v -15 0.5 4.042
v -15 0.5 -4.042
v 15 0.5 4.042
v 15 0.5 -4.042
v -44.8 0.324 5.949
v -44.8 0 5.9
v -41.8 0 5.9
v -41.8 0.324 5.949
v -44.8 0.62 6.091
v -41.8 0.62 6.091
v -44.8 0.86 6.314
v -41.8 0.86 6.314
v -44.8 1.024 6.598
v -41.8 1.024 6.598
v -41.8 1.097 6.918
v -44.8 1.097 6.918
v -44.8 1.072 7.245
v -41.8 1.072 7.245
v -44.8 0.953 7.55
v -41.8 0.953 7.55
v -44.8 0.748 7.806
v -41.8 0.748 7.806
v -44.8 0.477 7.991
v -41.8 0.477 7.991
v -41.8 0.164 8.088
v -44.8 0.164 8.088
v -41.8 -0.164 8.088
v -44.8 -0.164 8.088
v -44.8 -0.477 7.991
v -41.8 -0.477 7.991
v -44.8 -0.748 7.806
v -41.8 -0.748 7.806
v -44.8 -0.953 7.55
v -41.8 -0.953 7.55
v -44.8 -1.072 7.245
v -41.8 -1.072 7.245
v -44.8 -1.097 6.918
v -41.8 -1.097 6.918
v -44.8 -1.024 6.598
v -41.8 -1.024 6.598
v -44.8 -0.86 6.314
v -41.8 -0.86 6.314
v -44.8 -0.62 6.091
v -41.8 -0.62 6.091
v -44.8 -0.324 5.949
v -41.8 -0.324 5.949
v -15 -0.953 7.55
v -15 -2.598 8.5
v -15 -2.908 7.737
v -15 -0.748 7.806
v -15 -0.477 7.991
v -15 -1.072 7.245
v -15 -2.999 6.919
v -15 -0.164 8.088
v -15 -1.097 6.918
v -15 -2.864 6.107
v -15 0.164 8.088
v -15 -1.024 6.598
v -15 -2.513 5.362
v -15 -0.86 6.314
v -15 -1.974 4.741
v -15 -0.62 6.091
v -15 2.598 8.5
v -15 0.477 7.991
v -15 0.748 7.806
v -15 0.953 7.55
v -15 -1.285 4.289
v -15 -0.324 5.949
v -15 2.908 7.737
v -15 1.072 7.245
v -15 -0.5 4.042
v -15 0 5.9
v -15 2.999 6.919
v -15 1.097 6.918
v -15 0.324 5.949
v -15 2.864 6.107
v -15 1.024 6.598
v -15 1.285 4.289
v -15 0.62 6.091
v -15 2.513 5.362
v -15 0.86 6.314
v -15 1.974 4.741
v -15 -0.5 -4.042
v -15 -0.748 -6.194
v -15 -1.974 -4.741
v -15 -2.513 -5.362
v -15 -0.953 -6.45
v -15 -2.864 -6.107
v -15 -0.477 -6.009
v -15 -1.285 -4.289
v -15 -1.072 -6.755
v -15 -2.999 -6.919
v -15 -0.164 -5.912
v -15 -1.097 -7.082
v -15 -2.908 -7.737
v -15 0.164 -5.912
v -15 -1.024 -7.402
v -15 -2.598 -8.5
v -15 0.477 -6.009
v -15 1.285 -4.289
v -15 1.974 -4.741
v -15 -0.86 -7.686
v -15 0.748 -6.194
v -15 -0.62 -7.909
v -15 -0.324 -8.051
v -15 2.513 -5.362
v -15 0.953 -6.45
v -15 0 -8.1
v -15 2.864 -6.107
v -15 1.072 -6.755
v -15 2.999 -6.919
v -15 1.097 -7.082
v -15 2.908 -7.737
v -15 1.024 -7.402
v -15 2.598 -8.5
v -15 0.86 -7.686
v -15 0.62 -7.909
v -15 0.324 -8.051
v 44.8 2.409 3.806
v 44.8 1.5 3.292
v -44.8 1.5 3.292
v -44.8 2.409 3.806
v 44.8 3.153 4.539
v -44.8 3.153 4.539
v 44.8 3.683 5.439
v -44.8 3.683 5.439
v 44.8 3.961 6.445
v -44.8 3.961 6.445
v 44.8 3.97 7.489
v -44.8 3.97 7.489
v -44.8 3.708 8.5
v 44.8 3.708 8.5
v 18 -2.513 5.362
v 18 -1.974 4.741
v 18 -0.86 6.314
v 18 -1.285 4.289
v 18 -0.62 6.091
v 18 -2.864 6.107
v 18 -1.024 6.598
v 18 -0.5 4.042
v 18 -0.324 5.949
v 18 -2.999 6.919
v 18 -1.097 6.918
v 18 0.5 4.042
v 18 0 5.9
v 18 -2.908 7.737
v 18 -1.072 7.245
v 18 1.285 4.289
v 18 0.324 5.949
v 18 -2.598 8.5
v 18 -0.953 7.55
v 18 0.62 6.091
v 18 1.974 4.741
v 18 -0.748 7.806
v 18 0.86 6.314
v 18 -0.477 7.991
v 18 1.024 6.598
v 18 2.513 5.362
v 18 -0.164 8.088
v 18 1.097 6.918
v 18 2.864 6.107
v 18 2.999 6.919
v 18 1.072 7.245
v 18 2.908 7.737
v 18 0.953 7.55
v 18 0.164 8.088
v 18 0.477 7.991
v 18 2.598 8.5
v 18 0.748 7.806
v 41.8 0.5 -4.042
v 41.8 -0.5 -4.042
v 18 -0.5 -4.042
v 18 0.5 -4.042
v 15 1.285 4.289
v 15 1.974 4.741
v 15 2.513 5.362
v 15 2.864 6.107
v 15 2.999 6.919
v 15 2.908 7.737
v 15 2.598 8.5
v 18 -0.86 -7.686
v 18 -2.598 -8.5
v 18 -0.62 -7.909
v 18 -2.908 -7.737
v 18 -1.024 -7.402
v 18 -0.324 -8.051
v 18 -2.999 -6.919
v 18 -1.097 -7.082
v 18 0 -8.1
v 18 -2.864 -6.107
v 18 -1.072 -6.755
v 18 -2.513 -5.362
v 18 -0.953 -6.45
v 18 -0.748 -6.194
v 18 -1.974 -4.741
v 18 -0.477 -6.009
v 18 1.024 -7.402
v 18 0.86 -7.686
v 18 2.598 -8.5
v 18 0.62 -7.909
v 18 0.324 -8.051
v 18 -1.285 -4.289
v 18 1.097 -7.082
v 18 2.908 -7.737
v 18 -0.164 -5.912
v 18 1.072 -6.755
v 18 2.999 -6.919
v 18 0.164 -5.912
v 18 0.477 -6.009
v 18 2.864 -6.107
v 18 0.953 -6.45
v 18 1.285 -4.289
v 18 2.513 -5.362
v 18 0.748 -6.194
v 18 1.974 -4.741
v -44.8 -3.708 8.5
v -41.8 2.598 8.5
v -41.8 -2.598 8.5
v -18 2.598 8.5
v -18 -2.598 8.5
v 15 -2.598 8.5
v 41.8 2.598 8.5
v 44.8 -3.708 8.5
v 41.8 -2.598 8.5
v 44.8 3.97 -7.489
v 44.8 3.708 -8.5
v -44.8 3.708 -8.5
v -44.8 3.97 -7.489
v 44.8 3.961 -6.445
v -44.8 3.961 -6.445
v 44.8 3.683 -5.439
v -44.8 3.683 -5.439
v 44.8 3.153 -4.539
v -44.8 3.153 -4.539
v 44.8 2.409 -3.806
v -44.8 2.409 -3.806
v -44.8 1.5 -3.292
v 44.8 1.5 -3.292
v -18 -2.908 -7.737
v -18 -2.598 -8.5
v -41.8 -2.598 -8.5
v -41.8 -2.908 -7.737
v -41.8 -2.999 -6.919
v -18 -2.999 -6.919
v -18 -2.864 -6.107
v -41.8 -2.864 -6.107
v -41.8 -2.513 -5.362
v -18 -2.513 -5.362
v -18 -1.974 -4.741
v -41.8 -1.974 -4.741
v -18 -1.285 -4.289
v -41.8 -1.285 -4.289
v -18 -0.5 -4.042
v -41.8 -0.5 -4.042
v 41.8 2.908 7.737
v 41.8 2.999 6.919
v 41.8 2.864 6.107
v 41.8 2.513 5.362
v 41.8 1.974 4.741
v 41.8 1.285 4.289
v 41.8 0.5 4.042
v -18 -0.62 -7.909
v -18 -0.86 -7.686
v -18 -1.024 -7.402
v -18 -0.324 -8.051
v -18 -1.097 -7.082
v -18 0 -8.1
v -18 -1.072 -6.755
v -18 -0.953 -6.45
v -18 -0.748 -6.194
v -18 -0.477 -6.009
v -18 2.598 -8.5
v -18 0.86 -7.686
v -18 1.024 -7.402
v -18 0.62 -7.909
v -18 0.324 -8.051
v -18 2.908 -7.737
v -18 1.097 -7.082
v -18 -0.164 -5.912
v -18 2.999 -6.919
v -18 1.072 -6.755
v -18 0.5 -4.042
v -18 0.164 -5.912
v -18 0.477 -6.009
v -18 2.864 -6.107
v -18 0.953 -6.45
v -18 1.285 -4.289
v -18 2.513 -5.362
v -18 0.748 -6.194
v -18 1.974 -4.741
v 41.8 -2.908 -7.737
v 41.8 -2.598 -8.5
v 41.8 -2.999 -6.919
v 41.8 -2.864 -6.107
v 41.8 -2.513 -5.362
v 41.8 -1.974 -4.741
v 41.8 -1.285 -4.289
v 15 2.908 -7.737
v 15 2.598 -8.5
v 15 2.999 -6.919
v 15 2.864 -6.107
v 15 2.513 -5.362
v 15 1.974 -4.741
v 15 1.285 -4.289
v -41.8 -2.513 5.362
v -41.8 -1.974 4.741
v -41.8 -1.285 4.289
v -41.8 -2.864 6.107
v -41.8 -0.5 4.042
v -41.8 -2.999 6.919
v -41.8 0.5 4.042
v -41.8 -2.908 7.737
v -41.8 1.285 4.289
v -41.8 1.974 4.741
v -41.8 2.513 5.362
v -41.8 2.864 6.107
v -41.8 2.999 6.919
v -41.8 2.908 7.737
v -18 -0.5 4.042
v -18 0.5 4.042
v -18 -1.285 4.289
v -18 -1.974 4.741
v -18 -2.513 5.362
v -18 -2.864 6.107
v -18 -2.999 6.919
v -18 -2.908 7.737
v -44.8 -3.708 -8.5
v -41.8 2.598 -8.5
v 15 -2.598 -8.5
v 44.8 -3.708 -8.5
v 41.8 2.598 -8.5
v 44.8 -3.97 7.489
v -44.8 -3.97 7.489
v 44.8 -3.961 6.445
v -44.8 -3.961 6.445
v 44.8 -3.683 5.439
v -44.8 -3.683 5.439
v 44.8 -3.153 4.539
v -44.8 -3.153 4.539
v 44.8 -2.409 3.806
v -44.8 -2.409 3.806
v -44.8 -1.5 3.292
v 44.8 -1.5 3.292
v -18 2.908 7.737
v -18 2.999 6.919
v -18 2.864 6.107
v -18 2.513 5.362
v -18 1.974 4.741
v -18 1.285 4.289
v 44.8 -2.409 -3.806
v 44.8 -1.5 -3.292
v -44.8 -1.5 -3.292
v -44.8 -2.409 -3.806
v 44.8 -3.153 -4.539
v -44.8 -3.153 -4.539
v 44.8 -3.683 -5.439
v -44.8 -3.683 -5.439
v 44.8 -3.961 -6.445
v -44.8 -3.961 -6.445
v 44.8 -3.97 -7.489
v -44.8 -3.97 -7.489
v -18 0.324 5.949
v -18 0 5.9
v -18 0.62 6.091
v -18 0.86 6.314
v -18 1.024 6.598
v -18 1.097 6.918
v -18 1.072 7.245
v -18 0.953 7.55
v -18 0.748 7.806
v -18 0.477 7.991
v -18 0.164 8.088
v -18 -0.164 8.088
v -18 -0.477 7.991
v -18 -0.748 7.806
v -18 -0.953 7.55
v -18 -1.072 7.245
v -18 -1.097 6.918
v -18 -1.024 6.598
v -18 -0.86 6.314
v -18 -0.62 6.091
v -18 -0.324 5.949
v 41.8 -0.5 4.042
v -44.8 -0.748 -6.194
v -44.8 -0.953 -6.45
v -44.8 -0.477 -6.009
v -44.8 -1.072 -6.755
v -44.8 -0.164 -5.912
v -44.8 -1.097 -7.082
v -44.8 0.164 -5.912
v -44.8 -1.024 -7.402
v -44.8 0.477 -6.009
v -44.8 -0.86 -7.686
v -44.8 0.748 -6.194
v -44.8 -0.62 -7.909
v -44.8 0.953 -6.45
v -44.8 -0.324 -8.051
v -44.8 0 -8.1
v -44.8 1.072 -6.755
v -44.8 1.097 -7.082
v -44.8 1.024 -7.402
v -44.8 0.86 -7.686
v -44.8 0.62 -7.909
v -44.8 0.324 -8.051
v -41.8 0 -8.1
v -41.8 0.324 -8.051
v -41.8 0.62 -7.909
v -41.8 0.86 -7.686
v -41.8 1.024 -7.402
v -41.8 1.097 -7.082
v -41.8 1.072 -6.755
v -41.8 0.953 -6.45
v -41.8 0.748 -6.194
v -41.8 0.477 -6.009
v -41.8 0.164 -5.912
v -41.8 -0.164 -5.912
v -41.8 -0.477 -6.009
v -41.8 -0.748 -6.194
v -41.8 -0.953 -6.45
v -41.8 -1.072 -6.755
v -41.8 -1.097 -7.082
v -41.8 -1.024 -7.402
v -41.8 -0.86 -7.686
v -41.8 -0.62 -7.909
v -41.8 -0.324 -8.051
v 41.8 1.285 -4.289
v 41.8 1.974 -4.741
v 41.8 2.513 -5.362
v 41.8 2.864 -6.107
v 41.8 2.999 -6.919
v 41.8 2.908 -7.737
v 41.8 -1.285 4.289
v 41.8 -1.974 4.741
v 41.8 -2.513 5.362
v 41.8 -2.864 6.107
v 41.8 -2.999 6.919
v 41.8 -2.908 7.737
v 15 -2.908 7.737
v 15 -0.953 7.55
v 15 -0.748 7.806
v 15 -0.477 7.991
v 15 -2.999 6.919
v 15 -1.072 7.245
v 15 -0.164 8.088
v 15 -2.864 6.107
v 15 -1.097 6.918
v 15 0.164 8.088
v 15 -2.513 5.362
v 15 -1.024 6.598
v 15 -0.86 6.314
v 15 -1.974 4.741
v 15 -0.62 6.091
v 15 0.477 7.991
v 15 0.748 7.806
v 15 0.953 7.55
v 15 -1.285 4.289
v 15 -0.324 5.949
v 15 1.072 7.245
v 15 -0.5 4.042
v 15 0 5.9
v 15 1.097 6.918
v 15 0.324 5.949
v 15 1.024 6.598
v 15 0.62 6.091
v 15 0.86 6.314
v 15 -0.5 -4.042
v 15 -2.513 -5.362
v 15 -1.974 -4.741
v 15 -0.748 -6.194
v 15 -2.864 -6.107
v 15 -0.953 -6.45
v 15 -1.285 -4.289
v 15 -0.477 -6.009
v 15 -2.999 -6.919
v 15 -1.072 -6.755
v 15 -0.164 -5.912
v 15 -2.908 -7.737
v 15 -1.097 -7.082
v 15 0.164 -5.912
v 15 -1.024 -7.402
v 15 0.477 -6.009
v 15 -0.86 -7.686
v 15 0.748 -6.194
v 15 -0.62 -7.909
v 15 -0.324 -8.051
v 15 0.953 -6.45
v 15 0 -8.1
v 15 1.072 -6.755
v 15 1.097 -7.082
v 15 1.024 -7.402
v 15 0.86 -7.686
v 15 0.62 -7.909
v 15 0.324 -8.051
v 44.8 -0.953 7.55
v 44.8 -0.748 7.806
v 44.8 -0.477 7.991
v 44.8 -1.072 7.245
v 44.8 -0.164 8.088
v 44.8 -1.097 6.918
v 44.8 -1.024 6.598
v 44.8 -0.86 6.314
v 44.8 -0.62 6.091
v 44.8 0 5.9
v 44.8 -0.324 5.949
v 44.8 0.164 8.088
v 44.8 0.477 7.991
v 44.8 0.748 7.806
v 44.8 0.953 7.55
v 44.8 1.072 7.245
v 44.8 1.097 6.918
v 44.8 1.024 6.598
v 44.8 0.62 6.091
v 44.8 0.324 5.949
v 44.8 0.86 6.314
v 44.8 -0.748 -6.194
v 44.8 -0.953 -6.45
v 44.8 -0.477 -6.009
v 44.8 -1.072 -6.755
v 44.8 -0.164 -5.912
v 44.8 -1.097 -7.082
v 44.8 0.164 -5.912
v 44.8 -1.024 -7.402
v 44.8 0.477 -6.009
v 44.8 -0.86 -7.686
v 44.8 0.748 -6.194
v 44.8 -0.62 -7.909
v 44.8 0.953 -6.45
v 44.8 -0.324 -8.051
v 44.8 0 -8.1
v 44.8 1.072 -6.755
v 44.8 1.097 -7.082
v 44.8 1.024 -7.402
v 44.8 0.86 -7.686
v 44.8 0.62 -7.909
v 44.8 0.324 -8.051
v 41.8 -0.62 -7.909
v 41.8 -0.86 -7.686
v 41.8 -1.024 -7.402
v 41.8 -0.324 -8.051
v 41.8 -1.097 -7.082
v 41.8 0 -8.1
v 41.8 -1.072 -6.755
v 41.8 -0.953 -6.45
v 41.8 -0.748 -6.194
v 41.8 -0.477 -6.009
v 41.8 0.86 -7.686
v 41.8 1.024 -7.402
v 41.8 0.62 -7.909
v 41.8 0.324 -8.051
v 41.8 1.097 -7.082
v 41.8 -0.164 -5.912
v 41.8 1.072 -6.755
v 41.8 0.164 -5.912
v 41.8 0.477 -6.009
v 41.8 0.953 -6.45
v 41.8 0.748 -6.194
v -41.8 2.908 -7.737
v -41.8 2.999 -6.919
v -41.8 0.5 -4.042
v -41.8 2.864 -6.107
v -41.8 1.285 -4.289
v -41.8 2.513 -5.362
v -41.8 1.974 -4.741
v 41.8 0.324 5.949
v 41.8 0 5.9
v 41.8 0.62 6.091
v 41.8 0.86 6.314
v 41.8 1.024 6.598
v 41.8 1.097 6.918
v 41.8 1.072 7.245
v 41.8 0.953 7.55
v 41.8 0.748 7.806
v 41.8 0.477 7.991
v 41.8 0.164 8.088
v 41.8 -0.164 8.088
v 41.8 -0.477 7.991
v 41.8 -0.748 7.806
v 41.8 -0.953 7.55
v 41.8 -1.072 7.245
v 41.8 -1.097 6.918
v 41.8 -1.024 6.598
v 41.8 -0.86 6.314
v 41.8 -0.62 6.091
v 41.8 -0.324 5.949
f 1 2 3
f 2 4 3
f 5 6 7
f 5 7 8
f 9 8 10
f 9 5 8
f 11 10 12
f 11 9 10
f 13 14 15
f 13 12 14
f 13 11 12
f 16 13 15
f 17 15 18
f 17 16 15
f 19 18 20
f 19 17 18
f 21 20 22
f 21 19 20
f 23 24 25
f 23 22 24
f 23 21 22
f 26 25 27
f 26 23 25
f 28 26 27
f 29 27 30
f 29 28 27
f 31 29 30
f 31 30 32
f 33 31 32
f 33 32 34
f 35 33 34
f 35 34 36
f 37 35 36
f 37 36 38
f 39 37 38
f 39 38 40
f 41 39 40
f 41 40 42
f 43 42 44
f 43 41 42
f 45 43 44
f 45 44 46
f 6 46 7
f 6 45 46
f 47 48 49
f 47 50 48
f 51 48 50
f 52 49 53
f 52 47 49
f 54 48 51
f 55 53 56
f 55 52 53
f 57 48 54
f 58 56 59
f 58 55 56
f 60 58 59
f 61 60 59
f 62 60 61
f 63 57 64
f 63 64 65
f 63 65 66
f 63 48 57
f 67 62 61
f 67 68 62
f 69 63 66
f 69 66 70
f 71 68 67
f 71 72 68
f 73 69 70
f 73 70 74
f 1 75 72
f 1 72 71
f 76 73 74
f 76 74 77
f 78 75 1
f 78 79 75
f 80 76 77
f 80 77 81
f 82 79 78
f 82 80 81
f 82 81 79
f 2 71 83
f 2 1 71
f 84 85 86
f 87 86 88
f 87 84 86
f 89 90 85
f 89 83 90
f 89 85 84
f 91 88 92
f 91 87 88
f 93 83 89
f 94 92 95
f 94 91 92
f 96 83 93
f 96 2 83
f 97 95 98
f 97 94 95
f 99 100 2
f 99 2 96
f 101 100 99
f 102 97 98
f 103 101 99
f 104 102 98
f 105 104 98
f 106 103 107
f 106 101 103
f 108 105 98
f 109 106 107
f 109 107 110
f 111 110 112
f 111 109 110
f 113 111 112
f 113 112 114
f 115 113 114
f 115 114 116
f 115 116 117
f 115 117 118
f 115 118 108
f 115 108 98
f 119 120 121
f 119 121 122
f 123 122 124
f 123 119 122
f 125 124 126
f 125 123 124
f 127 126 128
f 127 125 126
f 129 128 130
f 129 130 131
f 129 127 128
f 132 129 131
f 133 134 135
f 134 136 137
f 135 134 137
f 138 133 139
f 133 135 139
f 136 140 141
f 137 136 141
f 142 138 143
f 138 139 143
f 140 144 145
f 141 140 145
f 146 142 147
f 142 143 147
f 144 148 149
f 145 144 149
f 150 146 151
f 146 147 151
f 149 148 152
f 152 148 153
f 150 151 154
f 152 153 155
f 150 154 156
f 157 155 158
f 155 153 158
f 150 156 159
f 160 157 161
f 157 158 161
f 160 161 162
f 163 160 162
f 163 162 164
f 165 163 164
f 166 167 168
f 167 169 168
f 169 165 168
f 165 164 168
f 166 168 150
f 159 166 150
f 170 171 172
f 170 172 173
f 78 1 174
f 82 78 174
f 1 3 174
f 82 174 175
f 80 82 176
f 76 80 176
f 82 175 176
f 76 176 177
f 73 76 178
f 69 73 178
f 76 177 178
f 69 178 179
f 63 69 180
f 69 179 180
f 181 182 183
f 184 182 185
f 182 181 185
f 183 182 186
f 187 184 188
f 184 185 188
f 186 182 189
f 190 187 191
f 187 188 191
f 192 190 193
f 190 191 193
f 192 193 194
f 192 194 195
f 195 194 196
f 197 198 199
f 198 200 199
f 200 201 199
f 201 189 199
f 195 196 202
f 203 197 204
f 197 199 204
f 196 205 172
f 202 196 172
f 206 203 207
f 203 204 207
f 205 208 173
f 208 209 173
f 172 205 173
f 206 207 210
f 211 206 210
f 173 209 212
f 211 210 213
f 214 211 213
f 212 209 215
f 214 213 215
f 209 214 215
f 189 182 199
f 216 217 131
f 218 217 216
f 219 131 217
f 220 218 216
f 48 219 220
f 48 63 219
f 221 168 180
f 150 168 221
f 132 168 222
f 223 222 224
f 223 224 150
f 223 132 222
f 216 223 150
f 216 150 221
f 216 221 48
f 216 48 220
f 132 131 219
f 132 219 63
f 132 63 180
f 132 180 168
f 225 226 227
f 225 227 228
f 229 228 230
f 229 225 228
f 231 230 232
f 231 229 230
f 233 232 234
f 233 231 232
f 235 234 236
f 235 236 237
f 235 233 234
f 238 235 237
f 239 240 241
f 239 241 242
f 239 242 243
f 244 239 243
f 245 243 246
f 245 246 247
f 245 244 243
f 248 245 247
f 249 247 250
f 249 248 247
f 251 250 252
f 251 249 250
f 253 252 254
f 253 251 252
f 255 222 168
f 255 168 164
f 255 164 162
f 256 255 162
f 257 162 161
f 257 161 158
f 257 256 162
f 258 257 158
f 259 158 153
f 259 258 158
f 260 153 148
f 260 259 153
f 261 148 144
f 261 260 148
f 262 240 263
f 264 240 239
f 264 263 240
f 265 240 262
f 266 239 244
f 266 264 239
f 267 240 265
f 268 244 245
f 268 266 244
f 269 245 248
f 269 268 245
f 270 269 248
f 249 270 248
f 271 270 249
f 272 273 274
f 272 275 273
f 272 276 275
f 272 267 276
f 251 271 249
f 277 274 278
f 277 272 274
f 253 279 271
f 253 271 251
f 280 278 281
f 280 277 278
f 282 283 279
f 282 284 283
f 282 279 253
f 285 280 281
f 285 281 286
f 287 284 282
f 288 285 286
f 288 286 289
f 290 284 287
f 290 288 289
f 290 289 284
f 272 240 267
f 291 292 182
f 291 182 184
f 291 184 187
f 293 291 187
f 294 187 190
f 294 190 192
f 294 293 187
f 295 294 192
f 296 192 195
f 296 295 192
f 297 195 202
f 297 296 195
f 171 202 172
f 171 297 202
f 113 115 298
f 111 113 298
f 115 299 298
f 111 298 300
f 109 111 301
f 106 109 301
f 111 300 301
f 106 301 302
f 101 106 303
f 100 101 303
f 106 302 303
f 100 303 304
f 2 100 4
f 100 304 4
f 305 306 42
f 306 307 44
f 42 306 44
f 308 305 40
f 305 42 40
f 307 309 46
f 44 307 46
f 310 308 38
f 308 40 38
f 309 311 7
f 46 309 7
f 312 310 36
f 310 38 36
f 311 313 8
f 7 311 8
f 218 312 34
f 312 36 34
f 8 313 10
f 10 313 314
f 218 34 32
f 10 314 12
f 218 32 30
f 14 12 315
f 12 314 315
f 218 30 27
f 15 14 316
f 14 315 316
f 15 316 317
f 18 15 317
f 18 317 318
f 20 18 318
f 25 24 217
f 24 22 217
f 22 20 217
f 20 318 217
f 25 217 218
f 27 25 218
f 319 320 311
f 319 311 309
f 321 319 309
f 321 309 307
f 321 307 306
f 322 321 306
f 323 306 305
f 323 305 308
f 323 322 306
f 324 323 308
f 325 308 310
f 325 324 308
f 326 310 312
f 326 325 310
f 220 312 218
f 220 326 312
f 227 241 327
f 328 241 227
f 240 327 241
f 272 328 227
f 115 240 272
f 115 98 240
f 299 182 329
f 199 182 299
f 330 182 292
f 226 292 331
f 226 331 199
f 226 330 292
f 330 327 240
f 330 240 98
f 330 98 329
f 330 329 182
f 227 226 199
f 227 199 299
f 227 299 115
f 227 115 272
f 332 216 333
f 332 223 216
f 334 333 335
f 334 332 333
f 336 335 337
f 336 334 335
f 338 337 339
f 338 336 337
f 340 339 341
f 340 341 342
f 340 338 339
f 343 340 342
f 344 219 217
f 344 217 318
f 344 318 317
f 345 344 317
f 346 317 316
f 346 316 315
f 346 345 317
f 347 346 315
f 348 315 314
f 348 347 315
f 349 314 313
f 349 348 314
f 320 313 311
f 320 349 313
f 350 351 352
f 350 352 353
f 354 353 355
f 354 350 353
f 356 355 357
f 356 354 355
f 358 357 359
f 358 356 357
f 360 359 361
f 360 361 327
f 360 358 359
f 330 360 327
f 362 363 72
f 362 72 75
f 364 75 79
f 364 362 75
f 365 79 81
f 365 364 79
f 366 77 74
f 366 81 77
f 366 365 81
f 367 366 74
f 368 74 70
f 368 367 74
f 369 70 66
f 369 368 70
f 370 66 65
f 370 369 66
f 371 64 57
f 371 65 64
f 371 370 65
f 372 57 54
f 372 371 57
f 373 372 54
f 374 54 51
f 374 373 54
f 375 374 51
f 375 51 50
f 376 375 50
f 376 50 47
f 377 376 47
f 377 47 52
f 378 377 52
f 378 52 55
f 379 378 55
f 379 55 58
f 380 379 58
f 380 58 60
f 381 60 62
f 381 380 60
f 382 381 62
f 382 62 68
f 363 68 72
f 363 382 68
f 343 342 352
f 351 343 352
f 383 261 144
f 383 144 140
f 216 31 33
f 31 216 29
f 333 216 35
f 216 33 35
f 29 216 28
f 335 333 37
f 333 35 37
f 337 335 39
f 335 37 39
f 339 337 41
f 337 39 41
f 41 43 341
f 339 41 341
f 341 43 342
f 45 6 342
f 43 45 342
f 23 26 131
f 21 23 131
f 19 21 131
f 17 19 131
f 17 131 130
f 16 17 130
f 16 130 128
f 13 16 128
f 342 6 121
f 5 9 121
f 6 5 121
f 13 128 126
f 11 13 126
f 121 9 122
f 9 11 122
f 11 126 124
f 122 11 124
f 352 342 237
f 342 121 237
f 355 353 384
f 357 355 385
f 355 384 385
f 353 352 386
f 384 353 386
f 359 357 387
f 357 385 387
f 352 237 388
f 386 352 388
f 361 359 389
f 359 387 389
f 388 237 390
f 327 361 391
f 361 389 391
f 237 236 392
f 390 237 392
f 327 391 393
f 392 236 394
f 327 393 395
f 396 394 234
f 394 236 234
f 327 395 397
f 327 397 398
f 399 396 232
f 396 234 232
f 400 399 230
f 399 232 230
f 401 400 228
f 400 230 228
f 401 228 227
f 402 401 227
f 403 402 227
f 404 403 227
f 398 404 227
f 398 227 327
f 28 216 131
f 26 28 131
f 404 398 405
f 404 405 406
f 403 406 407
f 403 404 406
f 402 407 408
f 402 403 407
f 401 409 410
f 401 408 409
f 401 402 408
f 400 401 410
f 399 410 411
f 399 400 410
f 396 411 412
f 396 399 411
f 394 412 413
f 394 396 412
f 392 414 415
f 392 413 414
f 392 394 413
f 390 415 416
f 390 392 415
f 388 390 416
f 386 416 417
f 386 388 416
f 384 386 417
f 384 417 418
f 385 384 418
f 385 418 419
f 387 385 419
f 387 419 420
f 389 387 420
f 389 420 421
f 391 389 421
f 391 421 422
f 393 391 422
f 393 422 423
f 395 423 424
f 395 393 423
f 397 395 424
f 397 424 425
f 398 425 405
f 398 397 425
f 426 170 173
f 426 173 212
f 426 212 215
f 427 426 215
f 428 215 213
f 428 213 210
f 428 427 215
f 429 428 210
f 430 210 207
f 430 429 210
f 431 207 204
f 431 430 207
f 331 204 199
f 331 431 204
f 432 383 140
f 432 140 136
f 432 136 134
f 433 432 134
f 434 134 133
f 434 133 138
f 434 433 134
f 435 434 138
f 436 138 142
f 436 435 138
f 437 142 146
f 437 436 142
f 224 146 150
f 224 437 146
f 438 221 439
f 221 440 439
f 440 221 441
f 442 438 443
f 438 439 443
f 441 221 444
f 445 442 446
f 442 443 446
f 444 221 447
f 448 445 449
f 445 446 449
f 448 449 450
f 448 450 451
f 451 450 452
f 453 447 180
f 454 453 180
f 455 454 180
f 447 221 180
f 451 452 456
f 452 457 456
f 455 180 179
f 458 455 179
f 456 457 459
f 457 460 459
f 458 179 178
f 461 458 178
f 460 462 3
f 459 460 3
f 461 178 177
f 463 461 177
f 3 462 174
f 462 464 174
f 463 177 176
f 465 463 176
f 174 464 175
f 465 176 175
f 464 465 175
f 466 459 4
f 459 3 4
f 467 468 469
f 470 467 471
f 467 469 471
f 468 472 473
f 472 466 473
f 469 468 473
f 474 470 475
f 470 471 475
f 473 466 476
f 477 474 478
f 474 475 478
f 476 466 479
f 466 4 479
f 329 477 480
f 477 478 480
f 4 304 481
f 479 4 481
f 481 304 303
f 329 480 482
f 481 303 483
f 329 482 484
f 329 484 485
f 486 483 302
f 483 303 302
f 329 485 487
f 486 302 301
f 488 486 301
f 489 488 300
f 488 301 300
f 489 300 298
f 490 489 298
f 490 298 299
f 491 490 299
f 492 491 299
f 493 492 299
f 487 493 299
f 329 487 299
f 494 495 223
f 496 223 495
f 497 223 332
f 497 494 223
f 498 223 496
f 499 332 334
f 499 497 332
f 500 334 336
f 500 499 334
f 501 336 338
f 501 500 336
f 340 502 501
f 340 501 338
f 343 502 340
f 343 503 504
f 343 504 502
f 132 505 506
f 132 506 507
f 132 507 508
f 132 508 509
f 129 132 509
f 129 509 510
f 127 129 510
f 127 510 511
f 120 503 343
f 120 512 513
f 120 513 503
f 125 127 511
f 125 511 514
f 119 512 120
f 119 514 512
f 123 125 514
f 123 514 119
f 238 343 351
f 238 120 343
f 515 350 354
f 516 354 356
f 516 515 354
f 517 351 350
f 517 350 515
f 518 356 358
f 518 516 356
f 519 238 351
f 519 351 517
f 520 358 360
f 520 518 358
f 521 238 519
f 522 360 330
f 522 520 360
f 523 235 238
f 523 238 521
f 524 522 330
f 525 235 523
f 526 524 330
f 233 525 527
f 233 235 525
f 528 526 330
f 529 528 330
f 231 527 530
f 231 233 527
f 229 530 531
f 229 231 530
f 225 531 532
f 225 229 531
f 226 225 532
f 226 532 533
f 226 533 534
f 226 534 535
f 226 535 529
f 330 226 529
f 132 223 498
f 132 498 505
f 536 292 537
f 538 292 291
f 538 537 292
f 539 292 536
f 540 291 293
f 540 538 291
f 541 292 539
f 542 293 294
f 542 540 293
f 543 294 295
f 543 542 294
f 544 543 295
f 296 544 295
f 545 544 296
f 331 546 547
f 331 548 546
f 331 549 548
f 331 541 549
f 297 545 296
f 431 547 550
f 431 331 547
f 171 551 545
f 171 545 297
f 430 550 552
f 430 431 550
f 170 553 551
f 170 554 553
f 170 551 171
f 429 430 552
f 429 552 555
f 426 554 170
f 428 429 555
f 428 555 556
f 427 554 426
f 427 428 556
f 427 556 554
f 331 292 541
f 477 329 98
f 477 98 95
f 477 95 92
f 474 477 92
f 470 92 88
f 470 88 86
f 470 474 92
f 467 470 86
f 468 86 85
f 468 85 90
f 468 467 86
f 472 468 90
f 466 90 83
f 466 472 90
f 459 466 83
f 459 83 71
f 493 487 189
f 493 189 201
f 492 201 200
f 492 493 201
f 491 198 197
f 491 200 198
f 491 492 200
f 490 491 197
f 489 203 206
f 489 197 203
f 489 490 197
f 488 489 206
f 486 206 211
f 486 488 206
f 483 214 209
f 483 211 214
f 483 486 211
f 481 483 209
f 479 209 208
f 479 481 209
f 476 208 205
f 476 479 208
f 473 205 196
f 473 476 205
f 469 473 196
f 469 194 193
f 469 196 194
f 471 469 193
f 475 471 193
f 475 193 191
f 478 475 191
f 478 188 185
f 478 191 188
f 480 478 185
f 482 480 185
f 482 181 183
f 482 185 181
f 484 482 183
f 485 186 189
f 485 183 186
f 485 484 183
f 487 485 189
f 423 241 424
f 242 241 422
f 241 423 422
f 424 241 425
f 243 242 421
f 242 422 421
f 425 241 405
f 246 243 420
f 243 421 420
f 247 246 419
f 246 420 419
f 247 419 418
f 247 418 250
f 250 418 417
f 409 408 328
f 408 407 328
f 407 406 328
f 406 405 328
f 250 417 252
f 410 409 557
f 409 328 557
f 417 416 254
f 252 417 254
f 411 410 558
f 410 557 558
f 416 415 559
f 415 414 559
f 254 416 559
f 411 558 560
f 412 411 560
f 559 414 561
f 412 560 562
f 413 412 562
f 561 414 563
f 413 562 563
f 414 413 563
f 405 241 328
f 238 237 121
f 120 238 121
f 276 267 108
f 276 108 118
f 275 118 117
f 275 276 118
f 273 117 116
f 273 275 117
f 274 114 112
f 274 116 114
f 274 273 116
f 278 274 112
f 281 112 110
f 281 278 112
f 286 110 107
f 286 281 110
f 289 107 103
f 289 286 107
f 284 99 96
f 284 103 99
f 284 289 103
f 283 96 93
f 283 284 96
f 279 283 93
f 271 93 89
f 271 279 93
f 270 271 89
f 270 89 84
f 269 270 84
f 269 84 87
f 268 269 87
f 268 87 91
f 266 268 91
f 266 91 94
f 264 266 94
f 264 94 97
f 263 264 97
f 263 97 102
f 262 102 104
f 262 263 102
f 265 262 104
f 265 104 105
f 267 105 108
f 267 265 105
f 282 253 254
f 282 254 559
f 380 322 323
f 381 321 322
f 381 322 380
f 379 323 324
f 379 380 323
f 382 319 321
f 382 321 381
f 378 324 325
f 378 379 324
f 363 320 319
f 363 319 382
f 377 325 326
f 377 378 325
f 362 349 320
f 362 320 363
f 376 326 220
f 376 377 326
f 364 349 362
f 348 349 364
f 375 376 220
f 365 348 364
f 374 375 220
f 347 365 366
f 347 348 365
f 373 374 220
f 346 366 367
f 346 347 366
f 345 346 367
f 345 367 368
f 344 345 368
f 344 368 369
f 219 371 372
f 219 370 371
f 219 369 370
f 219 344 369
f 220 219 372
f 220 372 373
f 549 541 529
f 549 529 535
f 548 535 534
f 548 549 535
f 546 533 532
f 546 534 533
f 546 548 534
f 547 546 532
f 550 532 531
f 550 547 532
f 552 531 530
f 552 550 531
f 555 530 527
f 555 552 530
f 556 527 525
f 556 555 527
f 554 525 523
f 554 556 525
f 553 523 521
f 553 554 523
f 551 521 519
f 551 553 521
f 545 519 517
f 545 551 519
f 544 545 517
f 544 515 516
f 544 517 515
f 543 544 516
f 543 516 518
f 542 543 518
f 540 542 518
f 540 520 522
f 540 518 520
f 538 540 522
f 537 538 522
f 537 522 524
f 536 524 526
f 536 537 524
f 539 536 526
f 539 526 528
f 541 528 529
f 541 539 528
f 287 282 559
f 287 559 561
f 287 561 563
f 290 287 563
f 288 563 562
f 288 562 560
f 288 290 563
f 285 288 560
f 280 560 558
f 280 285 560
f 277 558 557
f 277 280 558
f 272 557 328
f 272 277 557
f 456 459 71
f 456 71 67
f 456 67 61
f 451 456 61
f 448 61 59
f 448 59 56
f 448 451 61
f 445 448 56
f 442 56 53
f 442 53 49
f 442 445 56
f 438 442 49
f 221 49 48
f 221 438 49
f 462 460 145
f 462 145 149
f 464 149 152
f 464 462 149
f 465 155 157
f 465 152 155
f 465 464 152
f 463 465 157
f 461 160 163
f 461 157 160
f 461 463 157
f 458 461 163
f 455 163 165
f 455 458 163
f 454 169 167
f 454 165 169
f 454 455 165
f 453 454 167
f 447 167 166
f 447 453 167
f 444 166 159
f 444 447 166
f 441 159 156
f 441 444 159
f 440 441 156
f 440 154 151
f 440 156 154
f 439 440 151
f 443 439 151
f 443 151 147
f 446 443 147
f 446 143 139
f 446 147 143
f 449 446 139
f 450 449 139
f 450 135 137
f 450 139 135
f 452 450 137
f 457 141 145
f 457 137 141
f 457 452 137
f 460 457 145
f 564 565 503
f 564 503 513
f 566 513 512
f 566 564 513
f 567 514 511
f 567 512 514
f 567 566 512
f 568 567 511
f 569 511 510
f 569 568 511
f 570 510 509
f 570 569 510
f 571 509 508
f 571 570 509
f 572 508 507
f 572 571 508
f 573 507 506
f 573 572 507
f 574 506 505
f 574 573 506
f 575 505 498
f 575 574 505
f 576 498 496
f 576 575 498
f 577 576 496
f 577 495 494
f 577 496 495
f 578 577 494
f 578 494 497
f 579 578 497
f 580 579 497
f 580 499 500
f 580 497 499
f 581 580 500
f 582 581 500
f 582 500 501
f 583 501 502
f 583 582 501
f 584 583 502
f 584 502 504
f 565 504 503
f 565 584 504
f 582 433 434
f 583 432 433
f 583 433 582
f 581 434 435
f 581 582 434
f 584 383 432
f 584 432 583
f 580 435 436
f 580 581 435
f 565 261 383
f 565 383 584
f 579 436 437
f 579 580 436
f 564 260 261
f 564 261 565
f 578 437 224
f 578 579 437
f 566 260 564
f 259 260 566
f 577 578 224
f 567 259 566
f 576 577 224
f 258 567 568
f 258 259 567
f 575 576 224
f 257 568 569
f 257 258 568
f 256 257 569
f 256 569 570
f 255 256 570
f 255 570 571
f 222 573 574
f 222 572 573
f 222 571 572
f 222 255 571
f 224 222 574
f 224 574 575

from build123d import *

# Parameters (mm, degrees)
EXTRUDE_1_DEPTH          = 15
EXTRUDE_1_2_DEPTH        = 15
EXTRUDE_START            = 44.8
EXTRUDE_2_DEPTH          = 29.8
EXTRUDE_START_2          = -15
EXTRUDE_3_DEPTH          = 29.8
CUT_EXTRUDE_START        = 41.8
CUT_EXTRUDE_1_DEPTH      = 23.8
CUT_EXTRUDE_START_2      = -18
CUT_EXTRUDE_2_DEPTH      = 23.8
CUT_EXTRUDE_3_DEPTH      = 46.774337789
CUT_EXTRUDE_3_DEPTH_BACK = 46.774337789
SKETCH_4_R               = 1.1


with BuildPart() as part:
    # 草图1 → 凸台-拉伸1 (new, symmetric)
    with BuildSketch(Plane(origin=(0, 0, 0), x_dir=(0, 0, -1), z_dir=(1, 0, 0))):
        with BuildLine():
            Line((-3.291900756, 1.5), (3.291900756, 1.5))
            ThreePointArc((3.291900756, 1.5), (5.438638051, 3.682682292), (8.5, 3.708099244))
            Line((8.5, 3.708099244), (8.5, 2.598076211))
            ThreePointArc((8.5, 2.598076211), (5.722521613, 2.714415033), (4.041960108, 0.5))
            Line((4.041960108, 0.5), (-4.041960108, 0.5))
            ThreePointArc((-4.041960108, 0.5), (-5.722521613, 2.714415033), (-8.5, 2.598076211))
            Line((-8.5, 2.598076211), (-8.5, 3.708099244))
            ThreePointArc((-8.5, 3.708099244), (-5.438638051, 3.682682292), (-3.291900756, 1.5))
        make_face()
    extrude(amount=EXTRUDE_1_DEPTH, both=True)



with BuildPart() as body_2:
    # 草图1 → Extrude 1 2 (new, symmetric)
    with BuildSketch(Plane(origin=(0, 0, 0), x_dir=(0, 0, -1), z_dir=(1, 0, 0))):
        with BuildLine():
            Line((-3.291900756, -1.5), (3.291900756, -1.5))
            ThreePointArc((3.291900756, -1.5), (5.438638051, -3.682682292), (8.5, -3.708099244))
            Line((8.5, -3.708099244), (8.5, -2.598076211))
            ThreePointArc((8.5, -2.598076211), (5.722521613, -2.714415033), (4.041960108, -0.5))
            Line((4.041960108, -0.5), (-4.041960108, -0.5))
            ThreePointArc((-4.041960108, -0.5), (-5.722521613, -2.714415033), (-8.5, -2.598076211))
            Line((-8.5, -2.598076211), (-8.5, -3.708099244))
            ThreePointArc((-8.5, -3.708099244), (-5.438638051, -3.682682292), (-3.291900756, -1.5))
        make_face()
    extrude(amount=EXTRUDE_1_2_DEPTH, both=True)


with BuildPart() as part_1:
    add(part.part)

    add(body_2.part)  # 凸台-拉伸2 merges body 2
    # 草图2 → 凸台-拉伸2 (add)
    with BuildSketch(Plane(origin=(0, 0, 0), x_dir=(0, 0, -1), z_dir=(1, 0, 0)).offset(EXTRUDE_START)):
        with BuildLine():
            Line((-3.291900756, -1.5), (3.291900756, -1.5))
            ThreePointArc((3.291900756, -1.5), (5.438638051, -3.682682292), (8.5, -3.708099244))
            Line((8.5, -3.708099244), (8.5, 3.708099244))
            ThreePointArc((8.5, 3.708099244), (5.438638051, 3.682682292), (3.291900756, 1.5))
            Line((3.291900756, 1.5), (-3.291900756, 1.5))
            ThreePointArc((-3.291900756, 1.5), (-5.438638051, 3.682682292), (-8.5, 3.708099244))
            Line((-8.5, 3.708099244), (-8.5, -3.708099244))
            ThreePointArc((-8.5, -3.708099244), (-5.438638051, -3.682682292), (-3.291900756, -1.5))
        make_face()
    extrude(amount=-EXTRUDE_2_DEPTH)

    # 草图2<2> → 凸台-拉伸3 (add)
    with BuildSketch(Plane(origin=(0, 0, 0), x_dir=(0, 0, -1), z_dir=(1, 0, 0)).offset(EXTRUDE_START_2)):
        with BuildLine():
            Line((-3.291900756, -1.5), (3.291900756, -1.5))
            ThreePointArc((3.291900756, -1.5), (5.438638051, -3.682682292), (8.5, -3.708099244))
            Line((8.5, -3.708099244), (8.5, 3.708099244))
            ThreePointArc((8.5, 3.708099244), (5.438638051, 3.682682292), (3.291900756, 1.5))
            Line((3.291900756, 1.5), (-3.291900756, 1.5))
            ThreePointArc((-3.291900756, 1.5), (-5.438638051, 3.682682292), (-8.5, 3.708099244))
            Line((-8.5, 3.708099244), (-8.5, -3.708099244))
            ThreePointArc((-8.5, -3.708099244), (-5.438638051, -3.682682292), (-3.291900756, -1.5))
        make_face()
    extrude(amount=-EXTRUDE_3_DEPTH)

    # 草图3 → 切除-拉伸1 (cut)
    with BuildSketch(Plane(origin=(0, 0, 0), x_dir=(0, 0, -1), z_dir=(1, 0, 0)).offset(CUT_EXTRUDE_START)):
        with BuildLine():
            Line((-4.041960108, 0.5), (-4.041960108, -0.5))
            ThreePointArc((-4.041960108, -0.5), (-5.722521613, -2.714415033), (-8.5, -2.598076211))
            Line((-8.5, -2.598076211), (-8.5, 2.598076211))
            ThreePointArc((-8.5, 2.598076211), (-5.722521613, 2.714415033), (-4.041960108, 0.5))
        make_face()
        with BuildLine():
            Line((8.5, 2.598076211), (8.5, -2.598076211))
            ThreePointArc((8.5, -2.598076211), (5.722521613, -2.714415033), (4.041960108, -0.5))
            Line((4.041960108, -0.5), (4.041960108, 0.5))
            ThreePointArc((4.041960108, 0.5), (5.722521613, 2.714415033), (8.5, 2.598076211))
        make_face()
    extrude(amount=-CUT_EXTRUDE_1_DEPTH, mode=Mode.SUBTRACT)

    # 草图3<2> → 切除-拉伸2 (cut)
    with BuildSketch(Plane(origin=(0, 0, 0), x_dir=(0, 0, -1), z_dir=(1, 0, 0)).offset(CUT_EXTRUDE_START_2)):
        with BuildLine():
            Line((-4.041960108, 0.5), (-4.041960108, -0.5))
            ThreePointArc((-4.041960108, -0.5), (-5.722521613, -2.714415033), (-8.5, -2.598076211))
            Line((-8.5, -2.598076211), (-8.5, 2.598076211))
            ThreePointArc((-8.5, 2.598076211), (-5.722521613, 2.714415033), (-4.041960108, 0.5))
        make_face()
        with BuildLine():
            Line((8.5, 2.598076211), (8.5, -2.598076211))
            ThreePointArc((8.5, -2.598076211), (5.722521613, -2.714415033), (4.041960108, -0.5))
            Line((4.041960108, -0.5), (4.041960108, 0.5))
            ThreePointArc((4.041960108, 0.5), (5.722521613, 2.714415033), (8.5, 2.598076211))
        make_face()
    extrude(amount=-CUT_EXTRUDE_2_DEPTH, mode=Mode.SUBTRACT)

    # 草图4 → 切除-拉伸3 (cut, two sides: drawn at the far end of the back side and taken through both)
    with BuildSketch(Plane(origin=(0, 0, 0), x_dir=(0, 0, -1), z_dir=(1, 0, 0)).offset(-CUT_EXTRUDE_3_DEPTH_BACK)):
        with Locations((-7, 0)):
            Circle(SKETCH_4_R)
        with Locations((7, 0)):
            Circle(SKETCH_4_R)
    extrude(amount=CUT_EXTRUDE_3_DEPTH + CUT_EXTRUDE_3_DEPTH_BACK, mode=Mode.SUBTRACT)


solid = part_1.part
